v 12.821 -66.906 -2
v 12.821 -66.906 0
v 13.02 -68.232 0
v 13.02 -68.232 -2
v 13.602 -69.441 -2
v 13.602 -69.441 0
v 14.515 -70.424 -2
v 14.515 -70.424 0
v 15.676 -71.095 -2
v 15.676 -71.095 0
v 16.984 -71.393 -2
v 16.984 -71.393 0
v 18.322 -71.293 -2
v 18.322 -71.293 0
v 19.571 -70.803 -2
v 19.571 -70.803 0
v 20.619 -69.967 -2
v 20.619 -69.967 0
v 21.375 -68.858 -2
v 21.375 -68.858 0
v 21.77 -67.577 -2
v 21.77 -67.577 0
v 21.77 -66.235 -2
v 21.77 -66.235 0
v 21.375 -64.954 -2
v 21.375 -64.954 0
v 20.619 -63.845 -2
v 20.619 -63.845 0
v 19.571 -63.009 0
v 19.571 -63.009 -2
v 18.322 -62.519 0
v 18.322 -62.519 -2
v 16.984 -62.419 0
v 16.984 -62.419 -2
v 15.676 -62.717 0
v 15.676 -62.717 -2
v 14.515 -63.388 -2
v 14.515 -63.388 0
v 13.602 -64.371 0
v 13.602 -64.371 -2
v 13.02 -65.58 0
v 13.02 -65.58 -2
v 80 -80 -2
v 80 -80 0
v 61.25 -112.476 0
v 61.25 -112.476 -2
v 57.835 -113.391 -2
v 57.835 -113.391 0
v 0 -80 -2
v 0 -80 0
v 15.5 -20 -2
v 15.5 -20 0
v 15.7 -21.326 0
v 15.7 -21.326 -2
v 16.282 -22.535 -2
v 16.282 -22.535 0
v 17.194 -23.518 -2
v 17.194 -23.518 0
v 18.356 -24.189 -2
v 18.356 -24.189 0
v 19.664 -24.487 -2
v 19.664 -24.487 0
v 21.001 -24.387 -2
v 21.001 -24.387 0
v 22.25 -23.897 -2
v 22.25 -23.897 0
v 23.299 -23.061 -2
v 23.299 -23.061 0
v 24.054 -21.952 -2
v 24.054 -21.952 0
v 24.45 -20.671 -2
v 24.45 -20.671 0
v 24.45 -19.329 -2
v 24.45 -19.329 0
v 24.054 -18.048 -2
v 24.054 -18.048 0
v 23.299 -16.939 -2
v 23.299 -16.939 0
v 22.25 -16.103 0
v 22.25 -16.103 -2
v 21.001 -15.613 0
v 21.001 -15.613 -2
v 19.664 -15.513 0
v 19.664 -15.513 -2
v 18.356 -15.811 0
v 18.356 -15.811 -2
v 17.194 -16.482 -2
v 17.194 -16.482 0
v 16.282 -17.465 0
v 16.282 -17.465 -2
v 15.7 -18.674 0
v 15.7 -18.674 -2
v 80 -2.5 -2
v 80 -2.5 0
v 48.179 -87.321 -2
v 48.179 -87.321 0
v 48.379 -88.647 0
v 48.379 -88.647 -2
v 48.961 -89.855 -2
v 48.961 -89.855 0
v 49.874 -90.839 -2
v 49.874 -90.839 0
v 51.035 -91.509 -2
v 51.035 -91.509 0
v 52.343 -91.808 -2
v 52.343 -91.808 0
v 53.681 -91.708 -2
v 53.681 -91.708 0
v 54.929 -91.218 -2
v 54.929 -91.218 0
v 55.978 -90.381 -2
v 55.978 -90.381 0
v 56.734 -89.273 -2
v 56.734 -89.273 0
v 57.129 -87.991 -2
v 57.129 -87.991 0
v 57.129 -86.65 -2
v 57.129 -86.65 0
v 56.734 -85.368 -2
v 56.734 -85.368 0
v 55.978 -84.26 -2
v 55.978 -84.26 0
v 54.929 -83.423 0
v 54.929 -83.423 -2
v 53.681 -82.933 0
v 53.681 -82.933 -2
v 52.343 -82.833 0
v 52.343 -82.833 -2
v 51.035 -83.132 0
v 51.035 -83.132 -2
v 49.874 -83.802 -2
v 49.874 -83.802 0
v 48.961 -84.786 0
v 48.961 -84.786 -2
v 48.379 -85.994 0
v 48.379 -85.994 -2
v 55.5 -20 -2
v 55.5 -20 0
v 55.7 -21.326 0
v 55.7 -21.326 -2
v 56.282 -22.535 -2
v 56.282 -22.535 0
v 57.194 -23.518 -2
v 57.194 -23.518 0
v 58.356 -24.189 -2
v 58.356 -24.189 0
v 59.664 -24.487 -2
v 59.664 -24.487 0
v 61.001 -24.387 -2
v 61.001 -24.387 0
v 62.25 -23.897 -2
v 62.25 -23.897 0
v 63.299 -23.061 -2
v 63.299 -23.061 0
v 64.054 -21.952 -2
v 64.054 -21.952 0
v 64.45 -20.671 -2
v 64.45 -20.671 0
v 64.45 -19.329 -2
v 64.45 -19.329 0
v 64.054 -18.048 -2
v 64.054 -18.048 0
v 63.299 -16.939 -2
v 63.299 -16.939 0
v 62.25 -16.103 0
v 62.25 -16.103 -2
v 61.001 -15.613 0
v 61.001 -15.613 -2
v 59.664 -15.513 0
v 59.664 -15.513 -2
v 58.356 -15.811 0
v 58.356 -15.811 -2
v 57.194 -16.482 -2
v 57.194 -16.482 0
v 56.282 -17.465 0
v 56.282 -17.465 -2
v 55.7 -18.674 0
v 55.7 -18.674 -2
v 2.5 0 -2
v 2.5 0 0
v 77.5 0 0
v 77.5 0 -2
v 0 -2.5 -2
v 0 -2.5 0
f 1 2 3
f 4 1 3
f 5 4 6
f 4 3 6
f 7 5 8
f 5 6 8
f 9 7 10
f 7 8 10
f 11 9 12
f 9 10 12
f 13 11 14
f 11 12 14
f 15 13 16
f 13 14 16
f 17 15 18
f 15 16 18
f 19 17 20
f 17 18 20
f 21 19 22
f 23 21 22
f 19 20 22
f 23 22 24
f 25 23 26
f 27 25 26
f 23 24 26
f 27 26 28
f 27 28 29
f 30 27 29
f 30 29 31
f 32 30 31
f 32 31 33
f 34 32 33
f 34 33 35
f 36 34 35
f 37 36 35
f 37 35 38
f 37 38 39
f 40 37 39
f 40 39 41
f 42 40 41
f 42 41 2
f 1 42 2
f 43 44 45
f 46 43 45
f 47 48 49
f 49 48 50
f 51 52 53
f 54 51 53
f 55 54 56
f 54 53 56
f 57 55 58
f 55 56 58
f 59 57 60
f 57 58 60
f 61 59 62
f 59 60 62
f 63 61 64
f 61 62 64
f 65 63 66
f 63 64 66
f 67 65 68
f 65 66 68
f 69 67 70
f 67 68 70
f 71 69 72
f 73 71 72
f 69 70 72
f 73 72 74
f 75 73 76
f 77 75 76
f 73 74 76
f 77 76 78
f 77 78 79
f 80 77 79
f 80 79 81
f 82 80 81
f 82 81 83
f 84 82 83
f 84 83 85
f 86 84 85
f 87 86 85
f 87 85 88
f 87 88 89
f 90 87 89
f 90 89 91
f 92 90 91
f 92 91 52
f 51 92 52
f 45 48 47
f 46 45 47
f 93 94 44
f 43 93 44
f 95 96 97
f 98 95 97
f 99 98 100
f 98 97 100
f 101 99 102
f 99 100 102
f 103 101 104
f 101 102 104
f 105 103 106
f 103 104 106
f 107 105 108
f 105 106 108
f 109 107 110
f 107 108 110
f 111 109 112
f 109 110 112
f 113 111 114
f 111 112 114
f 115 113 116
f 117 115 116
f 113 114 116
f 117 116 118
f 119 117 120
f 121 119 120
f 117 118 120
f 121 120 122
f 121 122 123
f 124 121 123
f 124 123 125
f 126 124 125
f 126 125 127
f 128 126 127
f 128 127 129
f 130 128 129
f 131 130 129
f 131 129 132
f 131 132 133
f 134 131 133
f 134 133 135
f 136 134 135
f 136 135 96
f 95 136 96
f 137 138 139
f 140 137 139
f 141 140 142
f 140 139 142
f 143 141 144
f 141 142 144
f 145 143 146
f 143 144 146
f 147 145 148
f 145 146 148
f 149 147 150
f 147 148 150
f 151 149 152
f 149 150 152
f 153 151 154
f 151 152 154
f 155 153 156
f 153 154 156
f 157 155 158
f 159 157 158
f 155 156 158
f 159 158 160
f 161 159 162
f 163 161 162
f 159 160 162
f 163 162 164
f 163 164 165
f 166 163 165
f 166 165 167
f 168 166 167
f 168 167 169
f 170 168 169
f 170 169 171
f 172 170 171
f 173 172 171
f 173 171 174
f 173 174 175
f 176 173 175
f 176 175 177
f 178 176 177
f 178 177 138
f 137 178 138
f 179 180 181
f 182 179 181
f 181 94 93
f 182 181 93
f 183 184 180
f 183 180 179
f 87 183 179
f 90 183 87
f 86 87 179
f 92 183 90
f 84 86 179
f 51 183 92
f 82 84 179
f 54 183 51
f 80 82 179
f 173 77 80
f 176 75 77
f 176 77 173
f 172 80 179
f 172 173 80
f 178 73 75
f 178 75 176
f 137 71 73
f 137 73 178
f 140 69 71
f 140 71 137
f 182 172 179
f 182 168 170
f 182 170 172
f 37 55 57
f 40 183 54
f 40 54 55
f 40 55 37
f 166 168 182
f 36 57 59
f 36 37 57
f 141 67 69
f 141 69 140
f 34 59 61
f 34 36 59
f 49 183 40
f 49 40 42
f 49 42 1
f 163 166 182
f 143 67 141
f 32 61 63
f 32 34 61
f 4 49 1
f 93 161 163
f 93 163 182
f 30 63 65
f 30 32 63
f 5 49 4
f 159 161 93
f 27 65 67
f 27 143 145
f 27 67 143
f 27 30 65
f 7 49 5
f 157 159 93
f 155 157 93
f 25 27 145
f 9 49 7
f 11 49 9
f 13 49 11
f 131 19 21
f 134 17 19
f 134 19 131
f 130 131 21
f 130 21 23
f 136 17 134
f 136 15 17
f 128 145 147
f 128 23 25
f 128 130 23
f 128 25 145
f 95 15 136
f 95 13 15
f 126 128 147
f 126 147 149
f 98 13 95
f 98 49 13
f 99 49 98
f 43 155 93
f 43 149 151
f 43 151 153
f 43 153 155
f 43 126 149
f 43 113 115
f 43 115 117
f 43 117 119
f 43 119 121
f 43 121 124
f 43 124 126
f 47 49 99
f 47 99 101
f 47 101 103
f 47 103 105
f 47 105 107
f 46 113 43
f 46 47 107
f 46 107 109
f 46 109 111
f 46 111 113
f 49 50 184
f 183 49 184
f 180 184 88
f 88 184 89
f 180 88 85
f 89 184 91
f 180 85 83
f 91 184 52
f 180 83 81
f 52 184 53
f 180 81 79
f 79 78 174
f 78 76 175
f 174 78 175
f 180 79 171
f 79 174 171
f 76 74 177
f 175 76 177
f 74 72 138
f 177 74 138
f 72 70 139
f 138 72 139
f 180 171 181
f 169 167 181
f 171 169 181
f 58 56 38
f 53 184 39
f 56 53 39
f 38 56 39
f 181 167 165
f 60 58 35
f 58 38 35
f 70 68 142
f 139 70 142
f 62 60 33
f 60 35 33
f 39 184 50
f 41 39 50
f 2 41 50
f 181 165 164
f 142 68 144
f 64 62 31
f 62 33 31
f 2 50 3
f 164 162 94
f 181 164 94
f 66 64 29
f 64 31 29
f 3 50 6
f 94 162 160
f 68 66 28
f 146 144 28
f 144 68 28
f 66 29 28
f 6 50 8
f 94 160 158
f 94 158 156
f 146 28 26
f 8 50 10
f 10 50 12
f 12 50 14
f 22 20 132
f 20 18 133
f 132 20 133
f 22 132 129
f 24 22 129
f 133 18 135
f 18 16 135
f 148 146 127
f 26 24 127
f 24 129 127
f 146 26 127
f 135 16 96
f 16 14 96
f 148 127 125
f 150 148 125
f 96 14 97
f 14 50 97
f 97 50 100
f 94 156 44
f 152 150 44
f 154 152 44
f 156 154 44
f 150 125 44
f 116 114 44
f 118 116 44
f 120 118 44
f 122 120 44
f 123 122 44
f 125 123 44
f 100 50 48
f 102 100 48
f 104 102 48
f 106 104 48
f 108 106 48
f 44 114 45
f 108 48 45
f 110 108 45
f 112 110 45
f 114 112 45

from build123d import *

# Parameters (mm, degrees)
EXTRUDE_1_DEPTH   = 2
HOLE_WIZARD_M81_D = 9
CHAMFER_1_SIZE    = 2.5


with BuildPart() as part:
    # Эскиз3 → Бобышка-Вытянуть1 (new body)
    with BuildSketch(Plane(origin=(0, 0, 0), x_dir=(1, 0, 0), z_dir=(0, 0, -1))):
        Polygon((0, 0), (80, 0), (80, 80), (60, 114.641016151), (0, 80), align=None)
    extrude(amount=EXTRUDE_1_DEPTH)

    # Отверстие с зазором M81 (through all)
    with Locations(Plane(origin=(0, 0, -2), x_dir=(1, 0, 0), z_dir=(0, 0, -1))):
        with Locations((20, 20), (60, 20), (17.320508076, 66.905989232), (52.679491924, 87.320508076)):
            Hole(HOLE_WIZARD_M81_D / 2)

    # Фаска1
    chamfer_1_edges = [part.edges().sort_by_distance(p)[0] for p in [
        (60, -114.641016151, -1),
        (80, 0, -1),
        (0, 0, -1),
    ]]
    chamfer(chamfer_1_edges, length=CHAMFER_1_SIZE)


solid = part.part
